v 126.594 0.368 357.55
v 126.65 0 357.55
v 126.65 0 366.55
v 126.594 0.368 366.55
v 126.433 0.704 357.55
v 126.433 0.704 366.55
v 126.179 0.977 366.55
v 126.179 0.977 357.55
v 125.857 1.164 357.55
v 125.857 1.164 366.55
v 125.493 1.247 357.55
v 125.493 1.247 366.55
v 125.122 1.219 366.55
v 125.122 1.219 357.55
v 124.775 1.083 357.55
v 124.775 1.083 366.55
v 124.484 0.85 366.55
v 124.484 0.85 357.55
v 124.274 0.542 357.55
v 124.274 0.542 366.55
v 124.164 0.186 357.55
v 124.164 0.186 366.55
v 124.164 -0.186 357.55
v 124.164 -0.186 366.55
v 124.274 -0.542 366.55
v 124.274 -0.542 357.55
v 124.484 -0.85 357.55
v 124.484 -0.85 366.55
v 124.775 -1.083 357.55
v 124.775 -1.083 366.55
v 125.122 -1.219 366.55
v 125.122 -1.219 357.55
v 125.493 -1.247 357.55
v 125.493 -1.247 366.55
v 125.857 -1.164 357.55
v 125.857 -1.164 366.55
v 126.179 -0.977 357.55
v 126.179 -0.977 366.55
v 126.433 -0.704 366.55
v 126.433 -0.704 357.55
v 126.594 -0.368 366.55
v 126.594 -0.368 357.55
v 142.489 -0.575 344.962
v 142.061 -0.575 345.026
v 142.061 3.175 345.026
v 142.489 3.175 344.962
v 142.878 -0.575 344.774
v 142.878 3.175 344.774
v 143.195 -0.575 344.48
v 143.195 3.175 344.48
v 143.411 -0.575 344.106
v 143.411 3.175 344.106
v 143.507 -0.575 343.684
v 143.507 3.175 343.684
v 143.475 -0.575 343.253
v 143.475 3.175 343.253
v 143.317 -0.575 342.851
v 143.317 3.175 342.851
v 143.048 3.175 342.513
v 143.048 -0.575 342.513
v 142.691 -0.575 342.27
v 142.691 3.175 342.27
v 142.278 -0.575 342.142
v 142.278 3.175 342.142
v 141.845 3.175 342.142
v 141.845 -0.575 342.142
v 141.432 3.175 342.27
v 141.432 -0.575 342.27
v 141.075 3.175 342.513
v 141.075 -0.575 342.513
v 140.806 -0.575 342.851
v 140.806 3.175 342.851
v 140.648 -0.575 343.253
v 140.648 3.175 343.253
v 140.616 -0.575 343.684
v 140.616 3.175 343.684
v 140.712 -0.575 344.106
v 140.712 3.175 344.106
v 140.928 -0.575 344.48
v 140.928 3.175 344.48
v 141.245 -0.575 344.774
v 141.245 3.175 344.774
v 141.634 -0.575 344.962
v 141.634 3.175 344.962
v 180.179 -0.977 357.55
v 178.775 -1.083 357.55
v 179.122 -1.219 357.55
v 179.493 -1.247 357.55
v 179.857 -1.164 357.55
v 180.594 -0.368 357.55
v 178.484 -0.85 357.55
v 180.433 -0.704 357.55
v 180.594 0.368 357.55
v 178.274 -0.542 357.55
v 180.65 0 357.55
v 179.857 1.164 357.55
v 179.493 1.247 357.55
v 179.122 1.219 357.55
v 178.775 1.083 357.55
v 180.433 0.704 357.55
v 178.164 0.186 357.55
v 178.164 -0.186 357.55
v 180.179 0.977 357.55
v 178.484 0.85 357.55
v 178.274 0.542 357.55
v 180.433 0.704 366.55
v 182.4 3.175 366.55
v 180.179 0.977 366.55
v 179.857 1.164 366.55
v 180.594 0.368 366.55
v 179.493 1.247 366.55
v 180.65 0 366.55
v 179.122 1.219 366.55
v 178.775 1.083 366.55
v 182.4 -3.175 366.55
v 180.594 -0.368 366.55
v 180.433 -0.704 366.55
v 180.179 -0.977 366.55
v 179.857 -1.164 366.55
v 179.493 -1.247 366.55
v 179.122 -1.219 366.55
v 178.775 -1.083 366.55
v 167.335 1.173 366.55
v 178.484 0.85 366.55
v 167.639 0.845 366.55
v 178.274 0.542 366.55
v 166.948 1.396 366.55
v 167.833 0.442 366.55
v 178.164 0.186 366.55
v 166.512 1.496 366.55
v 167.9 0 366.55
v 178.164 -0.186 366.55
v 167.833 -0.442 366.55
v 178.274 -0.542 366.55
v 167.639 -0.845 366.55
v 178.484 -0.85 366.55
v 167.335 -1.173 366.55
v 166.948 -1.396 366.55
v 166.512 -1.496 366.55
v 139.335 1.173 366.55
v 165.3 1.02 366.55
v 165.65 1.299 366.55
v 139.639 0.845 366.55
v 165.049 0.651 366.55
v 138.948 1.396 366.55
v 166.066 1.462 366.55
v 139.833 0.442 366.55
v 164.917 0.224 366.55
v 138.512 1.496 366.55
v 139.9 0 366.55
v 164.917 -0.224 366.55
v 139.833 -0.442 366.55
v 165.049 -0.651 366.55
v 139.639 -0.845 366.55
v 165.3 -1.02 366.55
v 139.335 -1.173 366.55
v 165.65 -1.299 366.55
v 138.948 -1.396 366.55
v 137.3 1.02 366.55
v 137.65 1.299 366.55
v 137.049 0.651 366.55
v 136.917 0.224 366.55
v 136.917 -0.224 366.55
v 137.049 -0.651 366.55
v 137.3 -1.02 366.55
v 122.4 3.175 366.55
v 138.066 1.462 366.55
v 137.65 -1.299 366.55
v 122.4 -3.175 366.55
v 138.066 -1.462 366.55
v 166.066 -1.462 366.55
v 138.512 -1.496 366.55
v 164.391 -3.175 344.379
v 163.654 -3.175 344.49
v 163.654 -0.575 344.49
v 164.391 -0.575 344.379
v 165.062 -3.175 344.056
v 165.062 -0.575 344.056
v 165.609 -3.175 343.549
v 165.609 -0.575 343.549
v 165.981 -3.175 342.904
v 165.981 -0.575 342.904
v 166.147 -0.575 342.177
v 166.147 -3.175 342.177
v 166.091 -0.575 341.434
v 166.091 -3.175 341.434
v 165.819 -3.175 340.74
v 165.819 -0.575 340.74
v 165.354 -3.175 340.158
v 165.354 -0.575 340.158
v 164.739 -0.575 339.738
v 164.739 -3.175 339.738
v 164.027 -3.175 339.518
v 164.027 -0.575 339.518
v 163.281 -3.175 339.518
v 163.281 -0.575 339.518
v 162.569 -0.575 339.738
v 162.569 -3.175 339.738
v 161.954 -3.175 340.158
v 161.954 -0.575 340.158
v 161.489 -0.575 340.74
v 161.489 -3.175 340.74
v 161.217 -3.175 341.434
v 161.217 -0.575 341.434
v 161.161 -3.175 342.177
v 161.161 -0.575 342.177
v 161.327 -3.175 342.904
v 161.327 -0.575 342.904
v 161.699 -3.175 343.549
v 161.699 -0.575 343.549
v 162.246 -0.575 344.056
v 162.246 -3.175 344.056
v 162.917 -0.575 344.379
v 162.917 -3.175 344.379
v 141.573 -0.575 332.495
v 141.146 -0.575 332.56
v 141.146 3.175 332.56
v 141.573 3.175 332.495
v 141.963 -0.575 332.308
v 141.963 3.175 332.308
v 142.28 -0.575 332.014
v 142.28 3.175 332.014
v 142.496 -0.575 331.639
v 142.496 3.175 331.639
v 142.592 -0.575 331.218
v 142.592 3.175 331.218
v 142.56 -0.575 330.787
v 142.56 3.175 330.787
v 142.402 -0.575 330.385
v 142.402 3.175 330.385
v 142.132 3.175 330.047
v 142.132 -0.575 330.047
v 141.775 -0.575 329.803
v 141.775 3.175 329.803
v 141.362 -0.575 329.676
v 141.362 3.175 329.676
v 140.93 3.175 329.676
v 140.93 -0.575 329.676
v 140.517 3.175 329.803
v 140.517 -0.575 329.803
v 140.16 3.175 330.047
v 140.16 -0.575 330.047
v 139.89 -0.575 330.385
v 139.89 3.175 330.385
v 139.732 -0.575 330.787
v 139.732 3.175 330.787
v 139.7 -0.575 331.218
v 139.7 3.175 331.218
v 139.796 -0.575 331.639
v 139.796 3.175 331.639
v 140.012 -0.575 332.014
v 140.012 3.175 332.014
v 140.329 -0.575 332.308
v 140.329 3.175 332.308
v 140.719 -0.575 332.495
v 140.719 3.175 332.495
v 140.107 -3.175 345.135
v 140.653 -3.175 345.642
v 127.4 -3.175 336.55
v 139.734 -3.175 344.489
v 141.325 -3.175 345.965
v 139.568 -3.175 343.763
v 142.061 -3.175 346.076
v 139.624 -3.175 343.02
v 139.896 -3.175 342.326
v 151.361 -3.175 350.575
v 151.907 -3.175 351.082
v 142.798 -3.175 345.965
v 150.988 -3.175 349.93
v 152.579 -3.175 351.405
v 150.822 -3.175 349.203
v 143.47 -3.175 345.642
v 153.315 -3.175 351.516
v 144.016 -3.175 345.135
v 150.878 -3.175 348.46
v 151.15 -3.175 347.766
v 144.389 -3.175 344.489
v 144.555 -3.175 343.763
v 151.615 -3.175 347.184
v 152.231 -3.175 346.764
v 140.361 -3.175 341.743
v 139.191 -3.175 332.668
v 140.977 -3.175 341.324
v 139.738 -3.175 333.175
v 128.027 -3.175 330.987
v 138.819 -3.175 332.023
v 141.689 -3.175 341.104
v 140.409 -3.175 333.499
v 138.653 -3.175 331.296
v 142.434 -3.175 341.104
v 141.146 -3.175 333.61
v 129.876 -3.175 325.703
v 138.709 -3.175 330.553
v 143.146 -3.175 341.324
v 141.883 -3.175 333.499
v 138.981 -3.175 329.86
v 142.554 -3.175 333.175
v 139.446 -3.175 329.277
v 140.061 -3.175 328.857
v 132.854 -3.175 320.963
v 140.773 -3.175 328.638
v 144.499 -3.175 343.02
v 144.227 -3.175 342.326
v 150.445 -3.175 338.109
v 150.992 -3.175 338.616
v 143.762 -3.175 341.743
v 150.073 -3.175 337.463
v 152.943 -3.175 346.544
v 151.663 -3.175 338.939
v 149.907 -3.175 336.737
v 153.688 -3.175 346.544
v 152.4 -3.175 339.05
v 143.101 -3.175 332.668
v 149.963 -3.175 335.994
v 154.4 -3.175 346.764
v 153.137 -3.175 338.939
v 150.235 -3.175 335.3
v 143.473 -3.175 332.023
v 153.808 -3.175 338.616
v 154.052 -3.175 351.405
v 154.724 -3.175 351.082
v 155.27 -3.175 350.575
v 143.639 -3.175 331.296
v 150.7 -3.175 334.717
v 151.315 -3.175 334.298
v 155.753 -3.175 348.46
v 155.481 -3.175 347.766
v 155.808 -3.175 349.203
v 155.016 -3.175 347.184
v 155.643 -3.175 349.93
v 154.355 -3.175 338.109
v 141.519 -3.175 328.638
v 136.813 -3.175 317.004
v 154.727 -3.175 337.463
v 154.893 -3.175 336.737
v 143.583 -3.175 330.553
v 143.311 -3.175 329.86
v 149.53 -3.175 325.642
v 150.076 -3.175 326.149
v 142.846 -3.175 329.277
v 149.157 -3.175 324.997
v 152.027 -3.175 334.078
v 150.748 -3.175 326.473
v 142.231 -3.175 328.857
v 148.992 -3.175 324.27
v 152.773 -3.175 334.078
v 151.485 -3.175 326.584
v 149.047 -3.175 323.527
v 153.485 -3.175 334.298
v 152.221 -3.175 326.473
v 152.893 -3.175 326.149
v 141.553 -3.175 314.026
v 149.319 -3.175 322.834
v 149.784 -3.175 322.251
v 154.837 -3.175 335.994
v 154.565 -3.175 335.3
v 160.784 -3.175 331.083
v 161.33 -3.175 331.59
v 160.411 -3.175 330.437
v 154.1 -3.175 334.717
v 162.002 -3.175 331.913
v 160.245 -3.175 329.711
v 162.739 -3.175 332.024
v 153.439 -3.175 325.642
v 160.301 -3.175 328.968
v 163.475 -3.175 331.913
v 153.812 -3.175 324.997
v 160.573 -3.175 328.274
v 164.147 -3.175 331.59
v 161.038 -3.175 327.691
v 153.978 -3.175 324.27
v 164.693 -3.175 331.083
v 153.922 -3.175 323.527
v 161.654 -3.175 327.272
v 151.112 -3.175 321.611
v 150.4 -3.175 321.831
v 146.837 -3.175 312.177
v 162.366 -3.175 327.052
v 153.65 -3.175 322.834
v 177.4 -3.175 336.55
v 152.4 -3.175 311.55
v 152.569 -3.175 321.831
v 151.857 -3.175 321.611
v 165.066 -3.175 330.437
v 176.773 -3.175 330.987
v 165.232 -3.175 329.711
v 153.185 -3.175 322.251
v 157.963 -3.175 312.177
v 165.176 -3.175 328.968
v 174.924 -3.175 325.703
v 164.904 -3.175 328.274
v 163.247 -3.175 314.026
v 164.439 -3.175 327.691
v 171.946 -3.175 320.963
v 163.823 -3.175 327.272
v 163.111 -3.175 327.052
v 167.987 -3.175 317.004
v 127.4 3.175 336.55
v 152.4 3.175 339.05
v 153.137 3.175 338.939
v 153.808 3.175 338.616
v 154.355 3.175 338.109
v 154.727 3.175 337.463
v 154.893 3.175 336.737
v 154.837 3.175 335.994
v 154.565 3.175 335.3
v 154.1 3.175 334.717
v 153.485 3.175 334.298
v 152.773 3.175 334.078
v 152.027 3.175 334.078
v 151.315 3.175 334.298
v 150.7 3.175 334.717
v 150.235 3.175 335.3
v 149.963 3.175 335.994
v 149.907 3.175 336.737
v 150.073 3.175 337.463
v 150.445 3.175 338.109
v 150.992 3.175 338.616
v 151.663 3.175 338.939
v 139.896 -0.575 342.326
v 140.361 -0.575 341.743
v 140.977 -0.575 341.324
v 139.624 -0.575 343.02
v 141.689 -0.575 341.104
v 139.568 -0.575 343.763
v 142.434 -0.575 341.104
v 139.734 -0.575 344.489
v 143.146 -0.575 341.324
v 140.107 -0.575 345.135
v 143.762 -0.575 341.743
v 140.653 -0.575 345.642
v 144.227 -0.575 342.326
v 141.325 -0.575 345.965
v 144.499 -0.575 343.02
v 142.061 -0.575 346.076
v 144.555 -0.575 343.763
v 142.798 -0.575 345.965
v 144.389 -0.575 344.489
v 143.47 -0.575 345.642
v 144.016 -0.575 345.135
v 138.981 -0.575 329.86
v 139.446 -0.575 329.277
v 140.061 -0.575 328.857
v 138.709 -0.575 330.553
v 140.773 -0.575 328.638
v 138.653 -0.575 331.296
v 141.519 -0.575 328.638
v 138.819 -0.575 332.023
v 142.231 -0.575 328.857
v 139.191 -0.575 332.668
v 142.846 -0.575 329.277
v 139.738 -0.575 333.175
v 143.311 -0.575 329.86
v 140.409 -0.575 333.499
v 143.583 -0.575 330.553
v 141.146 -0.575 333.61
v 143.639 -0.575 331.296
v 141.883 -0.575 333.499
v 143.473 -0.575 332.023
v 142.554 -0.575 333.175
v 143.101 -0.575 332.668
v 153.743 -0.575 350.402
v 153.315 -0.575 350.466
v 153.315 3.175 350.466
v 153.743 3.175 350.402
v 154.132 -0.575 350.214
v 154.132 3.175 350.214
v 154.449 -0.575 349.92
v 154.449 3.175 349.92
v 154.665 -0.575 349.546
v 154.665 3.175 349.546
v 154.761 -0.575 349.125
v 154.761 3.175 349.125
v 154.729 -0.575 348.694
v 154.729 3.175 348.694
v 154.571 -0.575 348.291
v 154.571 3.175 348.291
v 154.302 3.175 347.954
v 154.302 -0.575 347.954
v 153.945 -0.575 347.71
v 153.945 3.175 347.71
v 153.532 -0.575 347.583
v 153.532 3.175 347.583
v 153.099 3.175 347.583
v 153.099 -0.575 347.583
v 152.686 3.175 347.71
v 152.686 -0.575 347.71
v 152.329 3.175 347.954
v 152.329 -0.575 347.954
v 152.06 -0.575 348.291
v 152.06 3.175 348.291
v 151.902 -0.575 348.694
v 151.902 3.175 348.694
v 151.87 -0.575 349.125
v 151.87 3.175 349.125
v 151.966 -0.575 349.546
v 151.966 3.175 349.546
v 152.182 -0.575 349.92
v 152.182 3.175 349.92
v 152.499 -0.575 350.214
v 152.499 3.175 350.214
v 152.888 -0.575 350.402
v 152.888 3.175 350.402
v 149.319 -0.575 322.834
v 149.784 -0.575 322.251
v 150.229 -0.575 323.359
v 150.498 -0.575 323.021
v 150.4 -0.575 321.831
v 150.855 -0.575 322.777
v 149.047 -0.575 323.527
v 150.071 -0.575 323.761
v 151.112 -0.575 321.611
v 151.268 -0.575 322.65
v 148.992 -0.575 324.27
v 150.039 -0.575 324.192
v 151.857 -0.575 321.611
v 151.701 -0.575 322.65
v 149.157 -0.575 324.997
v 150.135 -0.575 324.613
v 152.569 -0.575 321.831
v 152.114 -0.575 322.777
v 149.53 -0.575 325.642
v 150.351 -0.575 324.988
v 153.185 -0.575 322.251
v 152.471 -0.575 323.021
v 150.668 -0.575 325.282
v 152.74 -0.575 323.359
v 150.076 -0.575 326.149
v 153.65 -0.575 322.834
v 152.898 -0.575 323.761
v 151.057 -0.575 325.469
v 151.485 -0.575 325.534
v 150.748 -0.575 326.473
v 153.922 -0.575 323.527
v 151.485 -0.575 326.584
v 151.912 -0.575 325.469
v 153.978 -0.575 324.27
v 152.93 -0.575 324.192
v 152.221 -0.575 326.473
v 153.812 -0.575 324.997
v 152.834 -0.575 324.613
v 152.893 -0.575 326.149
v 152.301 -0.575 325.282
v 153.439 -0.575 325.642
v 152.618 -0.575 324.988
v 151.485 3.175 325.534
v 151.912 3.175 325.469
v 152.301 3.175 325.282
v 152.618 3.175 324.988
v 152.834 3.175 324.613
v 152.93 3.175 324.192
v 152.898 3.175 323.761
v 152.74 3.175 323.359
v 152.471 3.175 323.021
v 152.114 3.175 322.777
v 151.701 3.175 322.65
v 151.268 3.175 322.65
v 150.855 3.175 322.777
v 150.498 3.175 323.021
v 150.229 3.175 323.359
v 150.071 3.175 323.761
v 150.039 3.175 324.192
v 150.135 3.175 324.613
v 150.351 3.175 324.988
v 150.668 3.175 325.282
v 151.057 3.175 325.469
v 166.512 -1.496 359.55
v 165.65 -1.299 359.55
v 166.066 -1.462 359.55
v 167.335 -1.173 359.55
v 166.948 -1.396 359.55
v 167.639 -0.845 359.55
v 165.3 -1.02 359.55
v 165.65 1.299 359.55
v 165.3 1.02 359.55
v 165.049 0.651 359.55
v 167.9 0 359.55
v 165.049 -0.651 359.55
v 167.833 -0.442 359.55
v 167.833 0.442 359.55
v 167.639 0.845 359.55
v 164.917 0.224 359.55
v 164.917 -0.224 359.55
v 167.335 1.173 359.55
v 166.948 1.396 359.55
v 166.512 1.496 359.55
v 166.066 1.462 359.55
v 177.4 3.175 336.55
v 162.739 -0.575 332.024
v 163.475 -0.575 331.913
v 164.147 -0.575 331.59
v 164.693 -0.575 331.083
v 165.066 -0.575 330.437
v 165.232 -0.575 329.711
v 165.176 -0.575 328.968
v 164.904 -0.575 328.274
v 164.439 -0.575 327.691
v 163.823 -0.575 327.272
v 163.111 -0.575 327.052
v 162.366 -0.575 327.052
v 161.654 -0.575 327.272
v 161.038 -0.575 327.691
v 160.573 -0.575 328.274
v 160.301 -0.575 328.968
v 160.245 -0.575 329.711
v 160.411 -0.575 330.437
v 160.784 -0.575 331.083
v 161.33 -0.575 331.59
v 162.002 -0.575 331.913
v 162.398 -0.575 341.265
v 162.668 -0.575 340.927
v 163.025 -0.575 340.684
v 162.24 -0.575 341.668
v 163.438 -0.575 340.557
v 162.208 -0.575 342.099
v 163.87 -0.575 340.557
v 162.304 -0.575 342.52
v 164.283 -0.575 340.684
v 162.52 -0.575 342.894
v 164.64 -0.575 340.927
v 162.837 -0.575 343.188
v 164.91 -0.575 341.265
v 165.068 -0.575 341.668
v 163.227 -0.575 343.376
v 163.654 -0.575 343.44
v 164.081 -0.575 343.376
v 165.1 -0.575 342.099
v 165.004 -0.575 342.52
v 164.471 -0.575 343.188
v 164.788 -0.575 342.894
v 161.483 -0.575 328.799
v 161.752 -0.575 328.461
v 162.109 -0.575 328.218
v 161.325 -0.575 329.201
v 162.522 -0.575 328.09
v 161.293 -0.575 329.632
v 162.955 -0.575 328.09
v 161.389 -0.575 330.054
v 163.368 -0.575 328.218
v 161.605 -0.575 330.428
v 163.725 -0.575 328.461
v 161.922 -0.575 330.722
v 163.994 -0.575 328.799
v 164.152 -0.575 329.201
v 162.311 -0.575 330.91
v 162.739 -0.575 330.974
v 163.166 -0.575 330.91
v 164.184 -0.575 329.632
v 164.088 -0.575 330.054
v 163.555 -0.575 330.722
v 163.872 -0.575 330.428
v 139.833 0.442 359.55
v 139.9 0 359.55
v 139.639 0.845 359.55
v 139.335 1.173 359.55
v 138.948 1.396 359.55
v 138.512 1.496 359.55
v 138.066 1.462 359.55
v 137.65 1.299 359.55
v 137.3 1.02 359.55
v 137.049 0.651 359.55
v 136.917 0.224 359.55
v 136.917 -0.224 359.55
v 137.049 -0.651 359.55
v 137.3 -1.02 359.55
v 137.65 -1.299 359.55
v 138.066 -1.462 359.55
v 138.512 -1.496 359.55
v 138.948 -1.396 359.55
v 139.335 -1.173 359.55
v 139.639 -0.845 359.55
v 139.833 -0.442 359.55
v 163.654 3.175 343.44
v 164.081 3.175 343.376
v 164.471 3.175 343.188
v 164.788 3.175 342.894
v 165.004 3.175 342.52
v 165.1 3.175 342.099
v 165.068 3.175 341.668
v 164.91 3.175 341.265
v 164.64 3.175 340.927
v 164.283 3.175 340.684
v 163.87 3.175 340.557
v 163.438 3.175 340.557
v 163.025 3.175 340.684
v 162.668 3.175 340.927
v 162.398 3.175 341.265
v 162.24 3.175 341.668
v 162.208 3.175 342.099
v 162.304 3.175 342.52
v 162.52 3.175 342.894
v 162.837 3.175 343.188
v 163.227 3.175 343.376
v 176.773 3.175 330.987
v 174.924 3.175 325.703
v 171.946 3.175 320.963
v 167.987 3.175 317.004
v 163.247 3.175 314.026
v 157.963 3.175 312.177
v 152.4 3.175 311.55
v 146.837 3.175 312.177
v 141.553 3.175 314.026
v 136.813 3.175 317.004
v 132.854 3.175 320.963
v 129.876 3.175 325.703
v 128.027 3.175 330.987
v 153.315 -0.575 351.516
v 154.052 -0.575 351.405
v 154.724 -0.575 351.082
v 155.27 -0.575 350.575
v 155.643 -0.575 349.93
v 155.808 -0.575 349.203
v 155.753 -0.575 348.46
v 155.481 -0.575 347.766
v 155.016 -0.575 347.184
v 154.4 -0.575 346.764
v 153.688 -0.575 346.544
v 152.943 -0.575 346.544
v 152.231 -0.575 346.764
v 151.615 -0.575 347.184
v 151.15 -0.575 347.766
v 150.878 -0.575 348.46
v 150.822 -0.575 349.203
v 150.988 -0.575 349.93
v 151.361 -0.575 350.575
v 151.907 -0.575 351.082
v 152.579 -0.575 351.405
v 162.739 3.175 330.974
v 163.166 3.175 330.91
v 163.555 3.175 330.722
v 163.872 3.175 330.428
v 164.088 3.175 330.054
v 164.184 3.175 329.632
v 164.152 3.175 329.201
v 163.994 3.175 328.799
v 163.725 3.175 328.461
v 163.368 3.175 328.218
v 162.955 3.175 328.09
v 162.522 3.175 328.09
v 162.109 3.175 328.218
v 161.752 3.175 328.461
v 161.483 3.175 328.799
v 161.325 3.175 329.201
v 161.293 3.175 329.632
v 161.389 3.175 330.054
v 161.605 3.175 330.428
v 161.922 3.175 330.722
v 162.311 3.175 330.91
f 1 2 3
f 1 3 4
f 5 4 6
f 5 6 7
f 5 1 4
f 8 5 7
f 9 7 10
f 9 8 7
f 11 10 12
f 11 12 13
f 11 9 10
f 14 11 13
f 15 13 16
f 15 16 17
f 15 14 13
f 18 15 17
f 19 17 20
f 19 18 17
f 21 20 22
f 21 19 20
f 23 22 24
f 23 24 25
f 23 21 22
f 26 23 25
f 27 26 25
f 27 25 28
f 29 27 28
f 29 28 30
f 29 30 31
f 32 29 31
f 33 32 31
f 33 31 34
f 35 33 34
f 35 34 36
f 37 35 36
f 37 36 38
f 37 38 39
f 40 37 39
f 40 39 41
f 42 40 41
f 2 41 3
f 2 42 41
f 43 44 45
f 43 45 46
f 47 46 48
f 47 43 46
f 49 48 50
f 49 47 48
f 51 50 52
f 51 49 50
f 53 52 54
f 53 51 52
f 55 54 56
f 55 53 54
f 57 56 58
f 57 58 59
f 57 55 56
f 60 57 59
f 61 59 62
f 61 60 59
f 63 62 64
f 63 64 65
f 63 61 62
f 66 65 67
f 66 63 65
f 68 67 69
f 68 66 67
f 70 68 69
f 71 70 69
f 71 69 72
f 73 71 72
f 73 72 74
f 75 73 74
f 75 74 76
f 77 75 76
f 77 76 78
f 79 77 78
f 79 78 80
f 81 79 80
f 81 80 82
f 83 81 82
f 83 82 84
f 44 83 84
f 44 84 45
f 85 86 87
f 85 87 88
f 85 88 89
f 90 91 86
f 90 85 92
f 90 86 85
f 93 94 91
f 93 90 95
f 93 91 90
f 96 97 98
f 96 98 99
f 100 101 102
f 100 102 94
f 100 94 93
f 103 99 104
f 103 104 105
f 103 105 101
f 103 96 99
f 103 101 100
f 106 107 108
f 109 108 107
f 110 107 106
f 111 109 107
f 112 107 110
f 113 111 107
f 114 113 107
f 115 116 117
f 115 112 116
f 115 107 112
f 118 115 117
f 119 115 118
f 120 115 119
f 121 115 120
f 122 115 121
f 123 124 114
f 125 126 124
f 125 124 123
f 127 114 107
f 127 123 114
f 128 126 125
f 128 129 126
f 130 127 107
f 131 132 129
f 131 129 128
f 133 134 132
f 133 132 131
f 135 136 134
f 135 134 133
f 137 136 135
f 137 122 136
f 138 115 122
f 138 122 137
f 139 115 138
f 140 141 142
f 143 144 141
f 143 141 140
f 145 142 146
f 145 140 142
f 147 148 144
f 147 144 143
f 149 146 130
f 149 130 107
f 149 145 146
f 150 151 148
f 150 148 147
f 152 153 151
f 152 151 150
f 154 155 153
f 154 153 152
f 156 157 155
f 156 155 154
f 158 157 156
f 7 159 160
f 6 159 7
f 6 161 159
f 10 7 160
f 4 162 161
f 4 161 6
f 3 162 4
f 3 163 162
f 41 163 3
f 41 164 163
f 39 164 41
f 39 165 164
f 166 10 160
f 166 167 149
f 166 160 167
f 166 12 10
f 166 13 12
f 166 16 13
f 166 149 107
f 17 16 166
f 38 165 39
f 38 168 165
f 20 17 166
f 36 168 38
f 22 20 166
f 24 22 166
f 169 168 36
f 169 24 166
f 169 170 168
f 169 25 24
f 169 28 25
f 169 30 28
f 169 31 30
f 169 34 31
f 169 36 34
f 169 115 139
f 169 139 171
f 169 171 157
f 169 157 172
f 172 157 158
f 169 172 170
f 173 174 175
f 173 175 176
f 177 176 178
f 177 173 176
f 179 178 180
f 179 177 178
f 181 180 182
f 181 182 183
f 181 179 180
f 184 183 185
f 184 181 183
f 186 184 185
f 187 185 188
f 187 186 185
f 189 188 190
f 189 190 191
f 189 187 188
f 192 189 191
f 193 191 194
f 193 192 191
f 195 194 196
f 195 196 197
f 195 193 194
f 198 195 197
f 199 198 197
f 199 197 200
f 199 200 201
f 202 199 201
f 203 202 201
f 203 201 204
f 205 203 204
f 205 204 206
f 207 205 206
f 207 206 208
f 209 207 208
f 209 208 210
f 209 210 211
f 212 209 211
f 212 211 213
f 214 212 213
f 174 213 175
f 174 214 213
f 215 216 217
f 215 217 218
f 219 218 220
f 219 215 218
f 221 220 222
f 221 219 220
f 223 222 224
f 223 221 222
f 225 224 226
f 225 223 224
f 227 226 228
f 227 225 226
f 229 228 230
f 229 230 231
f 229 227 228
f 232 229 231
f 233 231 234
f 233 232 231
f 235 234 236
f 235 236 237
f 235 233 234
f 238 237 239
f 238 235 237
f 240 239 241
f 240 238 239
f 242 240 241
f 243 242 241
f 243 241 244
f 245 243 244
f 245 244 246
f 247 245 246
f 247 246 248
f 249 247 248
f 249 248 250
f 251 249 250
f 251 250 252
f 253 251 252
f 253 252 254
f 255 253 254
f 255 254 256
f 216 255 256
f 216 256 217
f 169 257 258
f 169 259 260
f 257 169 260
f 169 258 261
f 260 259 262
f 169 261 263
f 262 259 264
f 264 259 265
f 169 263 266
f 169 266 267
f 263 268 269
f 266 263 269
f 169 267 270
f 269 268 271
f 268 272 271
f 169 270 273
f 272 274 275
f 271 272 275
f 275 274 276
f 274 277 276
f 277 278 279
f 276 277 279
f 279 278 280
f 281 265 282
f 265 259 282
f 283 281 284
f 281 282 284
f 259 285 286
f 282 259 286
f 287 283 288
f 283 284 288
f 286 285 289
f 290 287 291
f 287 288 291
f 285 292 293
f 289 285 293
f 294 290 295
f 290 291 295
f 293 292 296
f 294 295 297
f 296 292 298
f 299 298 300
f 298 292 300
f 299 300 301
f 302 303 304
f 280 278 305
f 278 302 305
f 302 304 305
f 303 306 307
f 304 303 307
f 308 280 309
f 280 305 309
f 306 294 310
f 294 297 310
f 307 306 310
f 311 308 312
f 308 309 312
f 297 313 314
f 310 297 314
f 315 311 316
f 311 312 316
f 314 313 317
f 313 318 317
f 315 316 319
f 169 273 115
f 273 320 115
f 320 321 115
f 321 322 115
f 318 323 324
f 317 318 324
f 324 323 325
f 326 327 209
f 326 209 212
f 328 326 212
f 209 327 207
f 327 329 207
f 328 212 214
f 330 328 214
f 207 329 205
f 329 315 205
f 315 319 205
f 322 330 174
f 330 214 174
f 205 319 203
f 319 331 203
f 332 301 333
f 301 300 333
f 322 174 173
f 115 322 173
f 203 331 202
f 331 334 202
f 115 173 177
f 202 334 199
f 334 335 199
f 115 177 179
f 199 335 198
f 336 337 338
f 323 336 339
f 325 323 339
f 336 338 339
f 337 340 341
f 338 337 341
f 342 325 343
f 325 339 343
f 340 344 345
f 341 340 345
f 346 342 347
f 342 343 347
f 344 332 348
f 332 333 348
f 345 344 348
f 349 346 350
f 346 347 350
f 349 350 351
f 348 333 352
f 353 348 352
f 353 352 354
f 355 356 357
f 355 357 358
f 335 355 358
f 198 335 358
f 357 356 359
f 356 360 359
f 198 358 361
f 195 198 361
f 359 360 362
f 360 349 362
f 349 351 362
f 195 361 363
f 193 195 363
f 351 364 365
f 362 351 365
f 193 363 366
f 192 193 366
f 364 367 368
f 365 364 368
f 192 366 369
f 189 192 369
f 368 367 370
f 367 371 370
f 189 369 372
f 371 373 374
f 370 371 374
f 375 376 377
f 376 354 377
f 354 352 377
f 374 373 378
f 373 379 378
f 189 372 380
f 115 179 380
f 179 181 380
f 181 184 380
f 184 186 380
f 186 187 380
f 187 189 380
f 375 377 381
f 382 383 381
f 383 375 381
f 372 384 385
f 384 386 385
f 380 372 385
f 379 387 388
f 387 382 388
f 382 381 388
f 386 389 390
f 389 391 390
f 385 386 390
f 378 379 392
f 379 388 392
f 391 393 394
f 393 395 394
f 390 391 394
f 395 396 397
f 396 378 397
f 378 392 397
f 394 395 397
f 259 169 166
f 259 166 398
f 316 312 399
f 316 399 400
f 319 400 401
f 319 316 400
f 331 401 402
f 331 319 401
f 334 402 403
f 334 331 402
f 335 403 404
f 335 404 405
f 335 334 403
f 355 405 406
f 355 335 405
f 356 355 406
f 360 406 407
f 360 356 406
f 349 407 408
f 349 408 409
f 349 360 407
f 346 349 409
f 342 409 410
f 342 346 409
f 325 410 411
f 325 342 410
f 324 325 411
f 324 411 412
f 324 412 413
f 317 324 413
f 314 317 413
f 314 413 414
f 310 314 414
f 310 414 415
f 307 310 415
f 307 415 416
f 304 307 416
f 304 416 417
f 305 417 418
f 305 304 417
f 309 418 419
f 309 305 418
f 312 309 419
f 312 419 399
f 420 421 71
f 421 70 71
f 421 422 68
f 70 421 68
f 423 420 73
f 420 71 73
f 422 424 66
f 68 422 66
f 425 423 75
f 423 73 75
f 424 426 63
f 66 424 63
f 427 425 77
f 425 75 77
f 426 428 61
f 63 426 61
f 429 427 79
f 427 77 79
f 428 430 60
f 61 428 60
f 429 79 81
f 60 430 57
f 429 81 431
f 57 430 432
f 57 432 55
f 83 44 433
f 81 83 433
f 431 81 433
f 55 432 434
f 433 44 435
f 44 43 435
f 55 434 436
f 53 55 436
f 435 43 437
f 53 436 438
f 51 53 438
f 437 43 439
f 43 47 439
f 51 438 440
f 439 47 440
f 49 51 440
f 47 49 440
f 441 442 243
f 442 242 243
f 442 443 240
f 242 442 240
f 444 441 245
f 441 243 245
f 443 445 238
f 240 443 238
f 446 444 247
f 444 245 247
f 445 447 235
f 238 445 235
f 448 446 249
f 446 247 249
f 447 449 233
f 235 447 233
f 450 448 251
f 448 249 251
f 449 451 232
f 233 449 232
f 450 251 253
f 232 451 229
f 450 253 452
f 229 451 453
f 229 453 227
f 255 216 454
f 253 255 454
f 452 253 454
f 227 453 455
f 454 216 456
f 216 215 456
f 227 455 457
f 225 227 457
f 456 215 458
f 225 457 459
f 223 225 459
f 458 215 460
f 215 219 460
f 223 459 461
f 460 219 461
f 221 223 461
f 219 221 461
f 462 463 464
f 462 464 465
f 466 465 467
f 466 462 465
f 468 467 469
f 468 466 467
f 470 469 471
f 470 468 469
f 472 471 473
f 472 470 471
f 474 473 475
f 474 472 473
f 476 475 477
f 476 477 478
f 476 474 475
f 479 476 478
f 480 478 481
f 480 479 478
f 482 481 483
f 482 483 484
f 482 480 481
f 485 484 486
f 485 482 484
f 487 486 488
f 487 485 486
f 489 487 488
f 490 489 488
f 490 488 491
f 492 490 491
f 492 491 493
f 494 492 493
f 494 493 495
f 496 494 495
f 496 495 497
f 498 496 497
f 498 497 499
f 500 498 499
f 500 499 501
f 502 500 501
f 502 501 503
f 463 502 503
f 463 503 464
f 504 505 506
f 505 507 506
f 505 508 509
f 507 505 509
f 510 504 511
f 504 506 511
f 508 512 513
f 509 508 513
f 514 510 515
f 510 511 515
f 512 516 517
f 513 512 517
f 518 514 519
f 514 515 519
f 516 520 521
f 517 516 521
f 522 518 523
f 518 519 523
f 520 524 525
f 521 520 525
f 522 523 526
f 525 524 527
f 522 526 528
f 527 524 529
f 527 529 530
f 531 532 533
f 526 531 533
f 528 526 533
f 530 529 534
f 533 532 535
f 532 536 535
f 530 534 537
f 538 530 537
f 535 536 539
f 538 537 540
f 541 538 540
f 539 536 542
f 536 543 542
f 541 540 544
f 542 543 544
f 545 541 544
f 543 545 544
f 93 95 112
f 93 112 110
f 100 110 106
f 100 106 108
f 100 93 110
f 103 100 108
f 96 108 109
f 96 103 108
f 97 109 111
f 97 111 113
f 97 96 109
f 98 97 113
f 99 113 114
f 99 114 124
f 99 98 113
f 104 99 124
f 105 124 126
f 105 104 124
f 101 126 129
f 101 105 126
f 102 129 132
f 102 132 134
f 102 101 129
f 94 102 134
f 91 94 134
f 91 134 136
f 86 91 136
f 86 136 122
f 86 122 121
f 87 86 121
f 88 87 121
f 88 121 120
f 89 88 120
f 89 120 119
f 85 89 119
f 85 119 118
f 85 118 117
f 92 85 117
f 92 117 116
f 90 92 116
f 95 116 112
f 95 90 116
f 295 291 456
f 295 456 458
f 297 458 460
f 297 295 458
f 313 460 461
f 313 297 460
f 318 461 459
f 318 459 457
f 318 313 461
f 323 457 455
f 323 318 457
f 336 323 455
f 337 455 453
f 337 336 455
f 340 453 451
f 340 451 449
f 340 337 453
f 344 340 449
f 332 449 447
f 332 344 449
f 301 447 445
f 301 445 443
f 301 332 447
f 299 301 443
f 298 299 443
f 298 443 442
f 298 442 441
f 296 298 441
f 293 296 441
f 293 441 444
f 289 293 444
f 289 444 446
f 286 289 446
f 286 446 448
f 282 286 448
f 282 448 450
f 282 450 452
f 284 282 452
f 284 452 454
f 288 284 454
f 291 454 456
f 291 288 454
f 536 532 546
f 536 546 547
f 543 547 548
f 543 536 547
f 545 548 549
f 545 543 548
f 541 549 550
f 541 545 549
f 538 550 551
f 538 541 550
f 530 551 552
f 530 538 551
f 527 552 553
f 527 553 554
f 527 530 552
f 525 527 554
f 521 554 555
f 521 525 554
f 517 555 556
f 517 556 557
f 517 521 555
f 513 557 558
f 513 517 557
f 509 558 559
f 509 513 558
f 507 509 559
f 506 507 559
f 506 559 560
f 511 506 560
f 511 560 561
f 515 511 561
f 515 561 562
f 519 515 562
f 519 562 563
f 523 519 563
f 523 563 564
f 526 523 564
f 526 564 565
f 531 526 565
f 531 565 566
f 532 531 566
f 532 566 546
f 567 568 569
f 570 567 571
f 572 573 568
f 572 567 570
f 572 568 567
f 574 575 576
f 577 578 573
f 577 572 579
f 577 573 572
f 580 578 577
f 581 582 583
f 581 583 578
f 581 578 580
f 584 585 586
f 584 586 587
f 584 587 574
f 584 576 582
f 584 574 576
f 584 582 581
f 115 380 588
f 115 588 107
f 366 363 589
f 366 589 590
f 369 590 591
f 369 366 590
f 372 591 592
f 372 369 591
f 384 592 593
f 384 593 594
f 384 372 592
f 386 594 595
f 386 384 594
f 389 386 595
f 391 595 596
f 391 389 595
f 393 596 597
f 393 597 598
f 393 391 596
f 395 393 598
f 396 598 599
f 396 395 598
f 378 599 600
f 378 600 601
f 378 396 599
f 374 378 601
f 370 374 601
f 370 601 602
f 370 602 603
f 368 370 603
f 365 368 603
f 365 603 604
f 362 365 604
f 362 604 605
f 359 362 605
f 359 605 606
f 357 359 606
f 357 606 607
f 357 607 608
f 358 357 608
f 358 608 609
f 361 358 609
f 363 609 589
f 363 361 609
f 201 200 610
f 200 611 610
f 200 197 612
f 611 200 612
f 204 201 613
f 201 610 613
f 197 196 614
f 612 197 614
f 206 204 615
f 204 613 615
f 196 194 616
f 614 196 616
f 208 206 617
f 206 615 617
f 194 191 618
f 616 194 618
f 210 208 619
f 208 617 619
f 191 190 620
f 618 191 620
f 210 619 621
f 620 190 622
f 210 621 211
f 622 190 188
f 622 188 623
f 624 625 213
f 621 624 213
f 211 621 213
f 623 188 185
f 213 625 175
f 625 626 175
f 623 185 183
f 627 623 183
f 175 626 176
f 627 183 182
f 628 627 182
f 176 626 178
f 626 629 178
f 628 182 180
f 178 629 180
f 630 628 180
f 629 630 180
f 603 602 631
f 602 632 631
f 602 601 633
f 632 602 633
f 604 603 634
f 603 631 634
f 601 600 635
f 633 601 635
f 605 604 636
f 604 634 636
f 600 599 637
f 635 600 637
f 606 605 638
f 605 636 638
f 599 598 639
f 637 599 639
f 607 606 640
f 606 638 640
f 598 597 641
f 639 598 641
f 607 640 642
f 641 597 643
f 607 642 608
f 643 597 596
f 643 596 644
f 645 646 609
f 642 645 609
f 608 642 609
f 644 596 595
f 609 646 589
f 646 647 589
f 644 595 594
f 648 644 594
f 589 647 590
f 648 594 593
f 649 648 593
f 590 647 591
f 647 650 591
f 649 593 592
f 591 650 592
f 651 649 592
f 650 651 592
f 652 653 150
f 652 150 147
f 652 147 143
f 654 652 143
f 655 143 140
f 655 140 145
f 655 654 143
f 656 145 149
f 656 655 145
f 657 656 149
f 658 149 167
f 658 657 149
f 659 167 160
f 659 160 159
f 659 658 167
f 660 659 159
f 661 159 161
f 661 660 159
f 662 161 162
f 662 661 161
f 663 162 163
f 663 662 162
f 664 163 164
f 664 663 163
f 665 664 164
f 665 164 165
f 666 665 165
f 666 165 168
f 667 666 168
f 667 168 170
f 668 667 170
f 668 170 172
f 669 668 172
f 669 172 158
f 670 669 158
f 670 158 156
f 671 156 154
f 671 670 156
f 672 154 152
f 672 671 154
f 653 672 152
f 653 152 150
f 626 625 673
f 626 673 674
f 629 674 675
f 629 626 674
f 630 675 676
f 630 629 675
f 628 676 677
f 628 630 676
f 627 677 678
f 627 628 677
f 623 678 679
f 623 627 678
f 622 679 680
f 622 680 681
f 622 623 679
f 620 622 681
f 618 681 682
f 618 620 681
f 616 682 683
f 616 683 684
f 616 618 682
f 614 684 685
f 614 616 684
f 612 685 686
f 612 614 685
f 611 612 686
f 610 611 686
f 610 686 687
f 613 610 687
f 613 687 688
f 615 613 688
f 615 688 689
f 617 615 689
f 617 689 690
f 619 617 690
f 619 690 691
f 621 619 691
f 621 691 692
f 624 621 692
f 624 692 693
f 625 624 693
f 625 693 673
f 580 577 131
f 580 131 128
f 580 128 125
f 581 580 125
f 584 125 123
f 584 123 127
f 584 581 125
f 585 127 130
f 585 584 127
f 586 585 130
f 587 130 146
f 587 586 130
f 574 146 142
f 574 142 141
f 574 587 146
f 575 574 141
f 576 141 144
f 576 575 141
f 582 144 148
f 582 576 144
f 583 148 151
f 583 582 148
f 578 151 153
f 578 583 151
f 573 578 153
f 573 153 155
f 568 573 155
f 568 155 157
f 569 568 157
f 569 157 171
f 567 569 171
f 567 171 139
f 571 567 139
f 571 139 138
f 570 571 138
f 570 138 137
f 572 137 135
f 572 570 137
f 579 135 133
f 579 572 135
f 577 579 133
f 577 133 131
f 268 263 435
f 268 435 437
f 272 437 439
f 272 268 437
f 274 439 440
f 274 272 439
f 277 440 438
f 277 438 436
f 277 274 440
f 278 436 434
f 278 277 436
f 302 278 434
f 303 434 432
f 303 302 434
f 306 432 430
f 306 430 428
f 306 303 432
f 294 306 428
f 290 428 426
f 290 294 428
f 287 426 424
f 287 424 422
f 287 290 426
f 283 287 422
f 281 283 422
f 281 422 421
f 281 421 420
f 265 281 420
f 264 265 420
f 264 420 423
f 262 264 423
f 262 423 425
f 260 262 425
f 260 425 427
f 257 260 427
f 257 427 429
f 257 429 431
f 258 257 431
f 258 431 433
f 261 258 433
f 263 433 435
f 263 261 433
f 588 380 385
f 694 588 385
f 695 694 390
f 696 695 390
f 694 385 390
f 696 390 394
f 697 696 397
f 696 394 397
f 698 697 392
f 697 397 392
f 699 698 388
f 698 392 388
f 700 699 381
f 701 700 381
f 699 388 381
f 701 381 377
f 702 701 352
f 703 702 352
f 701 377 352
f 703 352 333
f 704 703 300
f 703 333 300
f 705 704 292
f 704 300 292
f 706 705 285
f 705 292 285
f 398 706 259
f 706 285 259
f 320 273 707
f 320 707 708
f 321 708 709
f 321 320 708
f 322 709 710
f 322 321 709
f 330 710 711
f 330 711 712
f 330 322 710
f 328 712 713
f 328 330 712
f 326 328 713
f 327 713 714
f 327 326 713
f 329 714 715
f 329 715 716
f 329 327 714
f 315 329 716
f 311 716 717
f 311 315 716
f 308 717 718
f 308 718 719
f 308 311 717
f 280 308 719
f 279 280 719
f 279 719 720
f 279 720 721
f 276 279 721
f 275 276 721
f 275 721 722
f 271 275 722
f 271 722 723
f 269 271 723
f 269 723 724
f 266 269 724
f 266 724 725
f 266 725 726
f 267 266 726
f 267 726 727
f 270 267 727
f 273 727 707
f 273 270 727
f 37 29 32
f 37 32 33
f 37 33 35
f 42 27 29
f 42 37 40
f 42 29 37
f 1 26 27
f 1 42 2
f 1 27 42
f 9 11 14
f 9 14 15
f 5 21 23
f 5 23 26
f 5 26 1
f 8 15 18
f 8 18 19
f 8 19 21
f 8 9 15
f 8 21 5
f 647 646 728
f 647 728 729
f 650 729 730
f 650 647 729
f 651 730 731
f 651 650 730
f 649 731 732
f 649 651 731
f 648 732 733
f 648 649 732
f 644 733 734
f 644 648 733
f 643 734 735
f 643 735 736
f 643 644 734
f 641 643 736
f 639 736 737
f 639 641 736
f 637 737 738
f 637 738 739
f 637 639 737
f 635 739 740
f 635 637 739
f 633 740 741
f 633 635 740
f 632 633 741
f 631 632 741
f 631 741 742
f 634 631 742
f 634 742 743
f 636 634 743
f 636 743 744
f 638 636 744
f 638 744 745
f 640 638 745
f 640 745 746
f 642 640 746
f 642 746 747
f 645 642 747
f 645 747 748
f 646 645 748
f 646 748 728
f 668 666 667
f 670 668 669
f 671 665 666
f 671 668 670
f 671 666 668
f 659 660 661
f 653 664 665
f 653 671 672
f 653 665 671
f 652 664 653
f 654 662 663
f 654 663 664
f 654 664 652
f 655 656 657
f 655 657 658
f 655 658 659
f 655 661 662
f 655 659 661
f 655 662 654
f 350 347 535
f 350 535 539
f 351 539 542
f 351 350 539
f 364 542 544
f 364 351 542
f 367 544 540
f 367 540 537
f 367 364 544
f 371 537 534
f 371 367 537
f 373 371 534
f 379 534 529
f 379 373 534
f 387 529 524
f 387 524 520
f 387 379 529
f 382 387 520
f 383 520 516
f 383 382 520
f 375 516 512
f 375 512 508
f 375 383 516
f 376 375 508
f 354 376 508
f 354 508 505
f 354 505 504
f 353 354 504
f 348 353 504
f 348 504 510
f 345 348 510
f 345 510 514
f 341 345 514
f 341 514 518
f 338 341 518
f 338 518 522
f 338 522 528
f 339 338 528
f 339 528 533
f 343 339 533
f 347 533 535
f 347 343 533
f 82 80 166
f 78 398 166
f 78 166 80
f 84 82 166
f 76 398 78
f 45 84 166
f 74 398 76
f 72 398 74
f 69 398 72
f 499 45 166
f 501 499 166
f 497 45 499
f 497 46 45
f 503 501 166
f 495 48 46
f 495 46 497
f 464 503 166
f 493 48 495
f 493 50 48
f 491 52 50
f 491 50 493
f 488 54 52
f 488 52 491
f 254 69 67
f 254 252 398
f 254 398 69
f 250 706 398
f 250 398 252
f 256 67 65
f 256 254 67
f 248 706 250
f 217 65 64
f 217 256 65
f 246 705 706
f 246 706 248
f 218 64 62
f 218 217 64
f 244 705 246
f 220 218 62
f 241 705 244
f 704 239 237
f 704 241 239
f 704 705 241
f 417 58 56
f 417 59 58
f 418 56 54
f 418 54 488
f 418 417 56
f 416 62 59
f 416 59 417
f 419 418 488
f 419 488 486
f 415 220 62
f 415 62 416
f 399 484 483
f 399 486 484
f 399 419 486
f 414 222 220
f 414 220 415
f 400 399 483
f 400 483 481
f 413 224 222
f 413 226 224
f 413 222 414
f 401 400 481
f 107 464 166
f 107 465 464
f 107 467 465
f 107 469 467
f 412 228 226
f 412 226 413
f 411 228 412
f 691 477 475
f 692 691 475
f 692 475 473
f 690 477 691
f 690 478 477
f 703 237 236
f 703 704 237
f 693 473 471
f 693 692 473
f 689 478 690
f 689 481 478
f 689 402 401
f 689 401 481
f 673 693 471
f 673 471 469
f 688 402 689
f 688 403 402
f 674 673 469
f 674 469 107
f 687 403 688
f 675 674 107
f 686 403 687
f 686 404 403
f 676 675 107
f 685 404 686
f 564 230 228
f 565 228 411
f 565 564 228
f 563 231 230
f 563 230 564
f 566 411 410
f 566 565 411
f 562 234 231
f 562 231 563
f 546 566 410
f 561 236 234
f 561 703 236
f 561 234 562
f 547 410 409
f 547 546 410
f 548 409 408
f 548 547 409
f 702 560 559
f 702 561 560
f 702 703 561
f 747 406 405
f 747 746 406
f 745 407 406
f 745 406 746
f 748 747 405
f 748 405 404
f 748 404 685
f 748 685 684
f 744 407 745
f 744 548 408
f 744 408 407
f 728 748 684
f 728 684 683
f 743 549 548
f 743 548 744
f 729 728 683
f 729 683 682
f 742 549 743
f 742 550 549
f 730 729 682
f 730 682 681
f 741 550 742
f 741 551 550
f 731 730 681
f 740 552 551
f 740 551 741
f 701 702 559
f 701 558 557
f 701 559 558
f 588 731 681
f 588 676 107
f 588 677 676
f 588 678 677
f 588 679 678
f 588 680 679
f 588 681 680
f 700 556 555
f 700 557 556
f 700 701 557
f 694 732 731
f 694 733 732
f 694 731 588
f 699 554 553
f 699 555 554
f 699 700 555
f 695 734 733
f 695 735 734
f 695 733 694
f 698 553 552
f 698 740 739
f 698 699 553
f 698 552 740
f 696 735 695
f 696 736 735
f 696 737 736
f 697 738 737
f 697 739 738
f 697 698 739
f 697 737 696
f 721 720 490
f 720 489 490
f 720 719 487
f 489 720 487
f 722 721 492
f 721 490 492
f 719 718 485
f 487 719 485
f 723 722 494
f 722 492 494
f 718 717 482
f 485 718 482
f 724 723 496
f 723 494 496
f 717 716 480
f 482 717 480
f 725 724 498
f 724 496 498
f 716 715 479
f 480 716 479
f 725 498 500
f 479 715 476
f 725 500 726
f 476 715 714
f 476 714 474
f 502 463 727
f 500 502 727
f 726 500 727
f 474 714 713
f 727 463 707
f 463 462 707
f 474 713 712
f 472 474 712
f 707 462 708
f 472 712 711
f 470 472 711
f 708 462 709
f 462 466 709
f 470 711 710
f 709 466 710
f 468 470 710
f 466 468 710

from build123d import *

# Parameters (mm, degrees)
PLACA_J5_START           = -3.175
PLACA_J5_DEPTH           = 6.35
PLACA_J5_REDONDEO_START  = -3.175
CROQUIS9_R               = 25
PLACA_J5_REDONDEO_DEPTH  = 6.35
BARRENOS_SALIDA_M5_START = -3.175
CROQUIS10_R              = 1.45
CROQUIS10_R_2            = 2.5
BARRENOS_SALIDA_M5_DEPTH = 6.35
REFRENTADO_M2_5_START    = -3.175
CROQUIS11_R              = 2.5
REFRENTADO_M2_5_DEPTH    = 2.6
ROSCA_M3_CANTO_START     = 357.55
CROQUIS12_R              = 1.25
ROSCA_M3_CANTO_DEPTH     = 9
PASADORES_D3_START       = 359.55
CROQUIS13_R              = 1.5
PASADORES_D3_DEPTH       = 7


with BuildPart() as part:
    # Croquis8 → Placa_J5 (new body)
    with BuildSketch(Plane(origin=(0, 0, 0), x_dir=(1, 0, 0), z_dir=(0, 1, 0)).offset(PLACA_J5_START)):
        Polygon((127.4, -336.55), (177.4, -336.55), (182.4, -366.55), (122.4, -366.55), align=None)
    extrude(amount=PLACA_J5_DEPTH)

    # Croquis9 → Placa_J5_redondeo (add)
    with BuildSketch(Plane(origin=(0, 0, 0), x_dir=(1, 0, 0), z_dir=(0, 1, 0)).offset(PLACA_J5_REDONDEO_START)):
        with Locations((152.4, -336.55)):
            Circle(CROQUIS9_R)
    extrude(amount=PLACA_J5_REDONDEO_DEPTH)

    # Croquis10 → Barrenos_salida_M5 (cut)
    with BuildSketch(Plane(origin=(0, 0, 0), x_dir=(1, 0, 0), z_dir=(0, 1, 0)).offset(BARRENOS_SALIDA_M5_START)):
        with Locations((163.653984643, -341.990388742)):
            Circle(CROQUIS10_R)
        with Locations((153.315477464, -349.016430965)):
            Circle(CROQUIS10_R)
        with Locations((142.061492822, -343.576042223)):
            Circle(CROQUIS10_R)
        with Locations((141.146015357, -331.109611258)):
            Circle(CROQUIS10_R)
        with Locations((151.484522536, -324.083569035)):
            Circle(CROQUIS10_R)
        with Locations((162.738507178, -329.523957777)):
            Circle(CROQUIS10_R)
        with Locations((152.4, -336.55)):
            Circle(CROQUIS10_R_2)
    extrude(amount=BARRENOS_SALIDA_M5_DEPTH, mode=Mode.SUBTRACT)

    # Croquis11 → Refrentado_M2-5 (cut)
    with BuildSketch(Plane(origin=(0, 0, 0), x_dir=(1, 0, 0), z_dir=(0, 1, 0)).offset(REFRENTADO_M2_5_START)):
        with Locations((163.653984643, -341.990388742)):
            Circle(CROQUIS11_R)
        with Locations((153.315477464, -349.016430965)):
            Circle(CROQUIS11_R)
        with Locations((142.061492822, -343.576042223)):
            Circle(CROQUIS11_R)
        with Locations((141.146015357, -331.109611258)):
            Circle(CROQUIS11_R)
        with Locations((151.484522536, -324.083569035)):
            Circle(CROQUIS11_R)
        with Locations((162.738507178, -329.523957777)):
            Circle(CROQUIS11_R)
    extrude(amount=REFRENTADO_M2_5_DEPTH, mode=Mode.SUBTRACT)

    # Croquis12 → Rosca_M3_canto (cut)
    with BuildSketch(Plane.XY.offset(ROSCA_M3_CANTO_START)):
        with Locations((125.4, 0)):
            Circle(CROQUIS12_R)
        with Locations((179.4, 0)):
            Circle(CROQUIS12_R)
    extrude(amount=ROSCA_M3_CANTO_DEPTH, mode=Mode.SUBTRACT)

    # Croquis13 → Pasadores_D3 (cut)
    with BuildSketch(Plane.XY.offset(PASADORES_D3_START)):
        with Locations((138.4, 0)):
            Circle(CROQUIS13_R)
        with Locations((166.4, 0)):
            Circle(CROQUIS13_R)
    extrude(amount=PASADORES_D3_DEPTH, mode=Mode.SUBTRACT)


solid = part.part
